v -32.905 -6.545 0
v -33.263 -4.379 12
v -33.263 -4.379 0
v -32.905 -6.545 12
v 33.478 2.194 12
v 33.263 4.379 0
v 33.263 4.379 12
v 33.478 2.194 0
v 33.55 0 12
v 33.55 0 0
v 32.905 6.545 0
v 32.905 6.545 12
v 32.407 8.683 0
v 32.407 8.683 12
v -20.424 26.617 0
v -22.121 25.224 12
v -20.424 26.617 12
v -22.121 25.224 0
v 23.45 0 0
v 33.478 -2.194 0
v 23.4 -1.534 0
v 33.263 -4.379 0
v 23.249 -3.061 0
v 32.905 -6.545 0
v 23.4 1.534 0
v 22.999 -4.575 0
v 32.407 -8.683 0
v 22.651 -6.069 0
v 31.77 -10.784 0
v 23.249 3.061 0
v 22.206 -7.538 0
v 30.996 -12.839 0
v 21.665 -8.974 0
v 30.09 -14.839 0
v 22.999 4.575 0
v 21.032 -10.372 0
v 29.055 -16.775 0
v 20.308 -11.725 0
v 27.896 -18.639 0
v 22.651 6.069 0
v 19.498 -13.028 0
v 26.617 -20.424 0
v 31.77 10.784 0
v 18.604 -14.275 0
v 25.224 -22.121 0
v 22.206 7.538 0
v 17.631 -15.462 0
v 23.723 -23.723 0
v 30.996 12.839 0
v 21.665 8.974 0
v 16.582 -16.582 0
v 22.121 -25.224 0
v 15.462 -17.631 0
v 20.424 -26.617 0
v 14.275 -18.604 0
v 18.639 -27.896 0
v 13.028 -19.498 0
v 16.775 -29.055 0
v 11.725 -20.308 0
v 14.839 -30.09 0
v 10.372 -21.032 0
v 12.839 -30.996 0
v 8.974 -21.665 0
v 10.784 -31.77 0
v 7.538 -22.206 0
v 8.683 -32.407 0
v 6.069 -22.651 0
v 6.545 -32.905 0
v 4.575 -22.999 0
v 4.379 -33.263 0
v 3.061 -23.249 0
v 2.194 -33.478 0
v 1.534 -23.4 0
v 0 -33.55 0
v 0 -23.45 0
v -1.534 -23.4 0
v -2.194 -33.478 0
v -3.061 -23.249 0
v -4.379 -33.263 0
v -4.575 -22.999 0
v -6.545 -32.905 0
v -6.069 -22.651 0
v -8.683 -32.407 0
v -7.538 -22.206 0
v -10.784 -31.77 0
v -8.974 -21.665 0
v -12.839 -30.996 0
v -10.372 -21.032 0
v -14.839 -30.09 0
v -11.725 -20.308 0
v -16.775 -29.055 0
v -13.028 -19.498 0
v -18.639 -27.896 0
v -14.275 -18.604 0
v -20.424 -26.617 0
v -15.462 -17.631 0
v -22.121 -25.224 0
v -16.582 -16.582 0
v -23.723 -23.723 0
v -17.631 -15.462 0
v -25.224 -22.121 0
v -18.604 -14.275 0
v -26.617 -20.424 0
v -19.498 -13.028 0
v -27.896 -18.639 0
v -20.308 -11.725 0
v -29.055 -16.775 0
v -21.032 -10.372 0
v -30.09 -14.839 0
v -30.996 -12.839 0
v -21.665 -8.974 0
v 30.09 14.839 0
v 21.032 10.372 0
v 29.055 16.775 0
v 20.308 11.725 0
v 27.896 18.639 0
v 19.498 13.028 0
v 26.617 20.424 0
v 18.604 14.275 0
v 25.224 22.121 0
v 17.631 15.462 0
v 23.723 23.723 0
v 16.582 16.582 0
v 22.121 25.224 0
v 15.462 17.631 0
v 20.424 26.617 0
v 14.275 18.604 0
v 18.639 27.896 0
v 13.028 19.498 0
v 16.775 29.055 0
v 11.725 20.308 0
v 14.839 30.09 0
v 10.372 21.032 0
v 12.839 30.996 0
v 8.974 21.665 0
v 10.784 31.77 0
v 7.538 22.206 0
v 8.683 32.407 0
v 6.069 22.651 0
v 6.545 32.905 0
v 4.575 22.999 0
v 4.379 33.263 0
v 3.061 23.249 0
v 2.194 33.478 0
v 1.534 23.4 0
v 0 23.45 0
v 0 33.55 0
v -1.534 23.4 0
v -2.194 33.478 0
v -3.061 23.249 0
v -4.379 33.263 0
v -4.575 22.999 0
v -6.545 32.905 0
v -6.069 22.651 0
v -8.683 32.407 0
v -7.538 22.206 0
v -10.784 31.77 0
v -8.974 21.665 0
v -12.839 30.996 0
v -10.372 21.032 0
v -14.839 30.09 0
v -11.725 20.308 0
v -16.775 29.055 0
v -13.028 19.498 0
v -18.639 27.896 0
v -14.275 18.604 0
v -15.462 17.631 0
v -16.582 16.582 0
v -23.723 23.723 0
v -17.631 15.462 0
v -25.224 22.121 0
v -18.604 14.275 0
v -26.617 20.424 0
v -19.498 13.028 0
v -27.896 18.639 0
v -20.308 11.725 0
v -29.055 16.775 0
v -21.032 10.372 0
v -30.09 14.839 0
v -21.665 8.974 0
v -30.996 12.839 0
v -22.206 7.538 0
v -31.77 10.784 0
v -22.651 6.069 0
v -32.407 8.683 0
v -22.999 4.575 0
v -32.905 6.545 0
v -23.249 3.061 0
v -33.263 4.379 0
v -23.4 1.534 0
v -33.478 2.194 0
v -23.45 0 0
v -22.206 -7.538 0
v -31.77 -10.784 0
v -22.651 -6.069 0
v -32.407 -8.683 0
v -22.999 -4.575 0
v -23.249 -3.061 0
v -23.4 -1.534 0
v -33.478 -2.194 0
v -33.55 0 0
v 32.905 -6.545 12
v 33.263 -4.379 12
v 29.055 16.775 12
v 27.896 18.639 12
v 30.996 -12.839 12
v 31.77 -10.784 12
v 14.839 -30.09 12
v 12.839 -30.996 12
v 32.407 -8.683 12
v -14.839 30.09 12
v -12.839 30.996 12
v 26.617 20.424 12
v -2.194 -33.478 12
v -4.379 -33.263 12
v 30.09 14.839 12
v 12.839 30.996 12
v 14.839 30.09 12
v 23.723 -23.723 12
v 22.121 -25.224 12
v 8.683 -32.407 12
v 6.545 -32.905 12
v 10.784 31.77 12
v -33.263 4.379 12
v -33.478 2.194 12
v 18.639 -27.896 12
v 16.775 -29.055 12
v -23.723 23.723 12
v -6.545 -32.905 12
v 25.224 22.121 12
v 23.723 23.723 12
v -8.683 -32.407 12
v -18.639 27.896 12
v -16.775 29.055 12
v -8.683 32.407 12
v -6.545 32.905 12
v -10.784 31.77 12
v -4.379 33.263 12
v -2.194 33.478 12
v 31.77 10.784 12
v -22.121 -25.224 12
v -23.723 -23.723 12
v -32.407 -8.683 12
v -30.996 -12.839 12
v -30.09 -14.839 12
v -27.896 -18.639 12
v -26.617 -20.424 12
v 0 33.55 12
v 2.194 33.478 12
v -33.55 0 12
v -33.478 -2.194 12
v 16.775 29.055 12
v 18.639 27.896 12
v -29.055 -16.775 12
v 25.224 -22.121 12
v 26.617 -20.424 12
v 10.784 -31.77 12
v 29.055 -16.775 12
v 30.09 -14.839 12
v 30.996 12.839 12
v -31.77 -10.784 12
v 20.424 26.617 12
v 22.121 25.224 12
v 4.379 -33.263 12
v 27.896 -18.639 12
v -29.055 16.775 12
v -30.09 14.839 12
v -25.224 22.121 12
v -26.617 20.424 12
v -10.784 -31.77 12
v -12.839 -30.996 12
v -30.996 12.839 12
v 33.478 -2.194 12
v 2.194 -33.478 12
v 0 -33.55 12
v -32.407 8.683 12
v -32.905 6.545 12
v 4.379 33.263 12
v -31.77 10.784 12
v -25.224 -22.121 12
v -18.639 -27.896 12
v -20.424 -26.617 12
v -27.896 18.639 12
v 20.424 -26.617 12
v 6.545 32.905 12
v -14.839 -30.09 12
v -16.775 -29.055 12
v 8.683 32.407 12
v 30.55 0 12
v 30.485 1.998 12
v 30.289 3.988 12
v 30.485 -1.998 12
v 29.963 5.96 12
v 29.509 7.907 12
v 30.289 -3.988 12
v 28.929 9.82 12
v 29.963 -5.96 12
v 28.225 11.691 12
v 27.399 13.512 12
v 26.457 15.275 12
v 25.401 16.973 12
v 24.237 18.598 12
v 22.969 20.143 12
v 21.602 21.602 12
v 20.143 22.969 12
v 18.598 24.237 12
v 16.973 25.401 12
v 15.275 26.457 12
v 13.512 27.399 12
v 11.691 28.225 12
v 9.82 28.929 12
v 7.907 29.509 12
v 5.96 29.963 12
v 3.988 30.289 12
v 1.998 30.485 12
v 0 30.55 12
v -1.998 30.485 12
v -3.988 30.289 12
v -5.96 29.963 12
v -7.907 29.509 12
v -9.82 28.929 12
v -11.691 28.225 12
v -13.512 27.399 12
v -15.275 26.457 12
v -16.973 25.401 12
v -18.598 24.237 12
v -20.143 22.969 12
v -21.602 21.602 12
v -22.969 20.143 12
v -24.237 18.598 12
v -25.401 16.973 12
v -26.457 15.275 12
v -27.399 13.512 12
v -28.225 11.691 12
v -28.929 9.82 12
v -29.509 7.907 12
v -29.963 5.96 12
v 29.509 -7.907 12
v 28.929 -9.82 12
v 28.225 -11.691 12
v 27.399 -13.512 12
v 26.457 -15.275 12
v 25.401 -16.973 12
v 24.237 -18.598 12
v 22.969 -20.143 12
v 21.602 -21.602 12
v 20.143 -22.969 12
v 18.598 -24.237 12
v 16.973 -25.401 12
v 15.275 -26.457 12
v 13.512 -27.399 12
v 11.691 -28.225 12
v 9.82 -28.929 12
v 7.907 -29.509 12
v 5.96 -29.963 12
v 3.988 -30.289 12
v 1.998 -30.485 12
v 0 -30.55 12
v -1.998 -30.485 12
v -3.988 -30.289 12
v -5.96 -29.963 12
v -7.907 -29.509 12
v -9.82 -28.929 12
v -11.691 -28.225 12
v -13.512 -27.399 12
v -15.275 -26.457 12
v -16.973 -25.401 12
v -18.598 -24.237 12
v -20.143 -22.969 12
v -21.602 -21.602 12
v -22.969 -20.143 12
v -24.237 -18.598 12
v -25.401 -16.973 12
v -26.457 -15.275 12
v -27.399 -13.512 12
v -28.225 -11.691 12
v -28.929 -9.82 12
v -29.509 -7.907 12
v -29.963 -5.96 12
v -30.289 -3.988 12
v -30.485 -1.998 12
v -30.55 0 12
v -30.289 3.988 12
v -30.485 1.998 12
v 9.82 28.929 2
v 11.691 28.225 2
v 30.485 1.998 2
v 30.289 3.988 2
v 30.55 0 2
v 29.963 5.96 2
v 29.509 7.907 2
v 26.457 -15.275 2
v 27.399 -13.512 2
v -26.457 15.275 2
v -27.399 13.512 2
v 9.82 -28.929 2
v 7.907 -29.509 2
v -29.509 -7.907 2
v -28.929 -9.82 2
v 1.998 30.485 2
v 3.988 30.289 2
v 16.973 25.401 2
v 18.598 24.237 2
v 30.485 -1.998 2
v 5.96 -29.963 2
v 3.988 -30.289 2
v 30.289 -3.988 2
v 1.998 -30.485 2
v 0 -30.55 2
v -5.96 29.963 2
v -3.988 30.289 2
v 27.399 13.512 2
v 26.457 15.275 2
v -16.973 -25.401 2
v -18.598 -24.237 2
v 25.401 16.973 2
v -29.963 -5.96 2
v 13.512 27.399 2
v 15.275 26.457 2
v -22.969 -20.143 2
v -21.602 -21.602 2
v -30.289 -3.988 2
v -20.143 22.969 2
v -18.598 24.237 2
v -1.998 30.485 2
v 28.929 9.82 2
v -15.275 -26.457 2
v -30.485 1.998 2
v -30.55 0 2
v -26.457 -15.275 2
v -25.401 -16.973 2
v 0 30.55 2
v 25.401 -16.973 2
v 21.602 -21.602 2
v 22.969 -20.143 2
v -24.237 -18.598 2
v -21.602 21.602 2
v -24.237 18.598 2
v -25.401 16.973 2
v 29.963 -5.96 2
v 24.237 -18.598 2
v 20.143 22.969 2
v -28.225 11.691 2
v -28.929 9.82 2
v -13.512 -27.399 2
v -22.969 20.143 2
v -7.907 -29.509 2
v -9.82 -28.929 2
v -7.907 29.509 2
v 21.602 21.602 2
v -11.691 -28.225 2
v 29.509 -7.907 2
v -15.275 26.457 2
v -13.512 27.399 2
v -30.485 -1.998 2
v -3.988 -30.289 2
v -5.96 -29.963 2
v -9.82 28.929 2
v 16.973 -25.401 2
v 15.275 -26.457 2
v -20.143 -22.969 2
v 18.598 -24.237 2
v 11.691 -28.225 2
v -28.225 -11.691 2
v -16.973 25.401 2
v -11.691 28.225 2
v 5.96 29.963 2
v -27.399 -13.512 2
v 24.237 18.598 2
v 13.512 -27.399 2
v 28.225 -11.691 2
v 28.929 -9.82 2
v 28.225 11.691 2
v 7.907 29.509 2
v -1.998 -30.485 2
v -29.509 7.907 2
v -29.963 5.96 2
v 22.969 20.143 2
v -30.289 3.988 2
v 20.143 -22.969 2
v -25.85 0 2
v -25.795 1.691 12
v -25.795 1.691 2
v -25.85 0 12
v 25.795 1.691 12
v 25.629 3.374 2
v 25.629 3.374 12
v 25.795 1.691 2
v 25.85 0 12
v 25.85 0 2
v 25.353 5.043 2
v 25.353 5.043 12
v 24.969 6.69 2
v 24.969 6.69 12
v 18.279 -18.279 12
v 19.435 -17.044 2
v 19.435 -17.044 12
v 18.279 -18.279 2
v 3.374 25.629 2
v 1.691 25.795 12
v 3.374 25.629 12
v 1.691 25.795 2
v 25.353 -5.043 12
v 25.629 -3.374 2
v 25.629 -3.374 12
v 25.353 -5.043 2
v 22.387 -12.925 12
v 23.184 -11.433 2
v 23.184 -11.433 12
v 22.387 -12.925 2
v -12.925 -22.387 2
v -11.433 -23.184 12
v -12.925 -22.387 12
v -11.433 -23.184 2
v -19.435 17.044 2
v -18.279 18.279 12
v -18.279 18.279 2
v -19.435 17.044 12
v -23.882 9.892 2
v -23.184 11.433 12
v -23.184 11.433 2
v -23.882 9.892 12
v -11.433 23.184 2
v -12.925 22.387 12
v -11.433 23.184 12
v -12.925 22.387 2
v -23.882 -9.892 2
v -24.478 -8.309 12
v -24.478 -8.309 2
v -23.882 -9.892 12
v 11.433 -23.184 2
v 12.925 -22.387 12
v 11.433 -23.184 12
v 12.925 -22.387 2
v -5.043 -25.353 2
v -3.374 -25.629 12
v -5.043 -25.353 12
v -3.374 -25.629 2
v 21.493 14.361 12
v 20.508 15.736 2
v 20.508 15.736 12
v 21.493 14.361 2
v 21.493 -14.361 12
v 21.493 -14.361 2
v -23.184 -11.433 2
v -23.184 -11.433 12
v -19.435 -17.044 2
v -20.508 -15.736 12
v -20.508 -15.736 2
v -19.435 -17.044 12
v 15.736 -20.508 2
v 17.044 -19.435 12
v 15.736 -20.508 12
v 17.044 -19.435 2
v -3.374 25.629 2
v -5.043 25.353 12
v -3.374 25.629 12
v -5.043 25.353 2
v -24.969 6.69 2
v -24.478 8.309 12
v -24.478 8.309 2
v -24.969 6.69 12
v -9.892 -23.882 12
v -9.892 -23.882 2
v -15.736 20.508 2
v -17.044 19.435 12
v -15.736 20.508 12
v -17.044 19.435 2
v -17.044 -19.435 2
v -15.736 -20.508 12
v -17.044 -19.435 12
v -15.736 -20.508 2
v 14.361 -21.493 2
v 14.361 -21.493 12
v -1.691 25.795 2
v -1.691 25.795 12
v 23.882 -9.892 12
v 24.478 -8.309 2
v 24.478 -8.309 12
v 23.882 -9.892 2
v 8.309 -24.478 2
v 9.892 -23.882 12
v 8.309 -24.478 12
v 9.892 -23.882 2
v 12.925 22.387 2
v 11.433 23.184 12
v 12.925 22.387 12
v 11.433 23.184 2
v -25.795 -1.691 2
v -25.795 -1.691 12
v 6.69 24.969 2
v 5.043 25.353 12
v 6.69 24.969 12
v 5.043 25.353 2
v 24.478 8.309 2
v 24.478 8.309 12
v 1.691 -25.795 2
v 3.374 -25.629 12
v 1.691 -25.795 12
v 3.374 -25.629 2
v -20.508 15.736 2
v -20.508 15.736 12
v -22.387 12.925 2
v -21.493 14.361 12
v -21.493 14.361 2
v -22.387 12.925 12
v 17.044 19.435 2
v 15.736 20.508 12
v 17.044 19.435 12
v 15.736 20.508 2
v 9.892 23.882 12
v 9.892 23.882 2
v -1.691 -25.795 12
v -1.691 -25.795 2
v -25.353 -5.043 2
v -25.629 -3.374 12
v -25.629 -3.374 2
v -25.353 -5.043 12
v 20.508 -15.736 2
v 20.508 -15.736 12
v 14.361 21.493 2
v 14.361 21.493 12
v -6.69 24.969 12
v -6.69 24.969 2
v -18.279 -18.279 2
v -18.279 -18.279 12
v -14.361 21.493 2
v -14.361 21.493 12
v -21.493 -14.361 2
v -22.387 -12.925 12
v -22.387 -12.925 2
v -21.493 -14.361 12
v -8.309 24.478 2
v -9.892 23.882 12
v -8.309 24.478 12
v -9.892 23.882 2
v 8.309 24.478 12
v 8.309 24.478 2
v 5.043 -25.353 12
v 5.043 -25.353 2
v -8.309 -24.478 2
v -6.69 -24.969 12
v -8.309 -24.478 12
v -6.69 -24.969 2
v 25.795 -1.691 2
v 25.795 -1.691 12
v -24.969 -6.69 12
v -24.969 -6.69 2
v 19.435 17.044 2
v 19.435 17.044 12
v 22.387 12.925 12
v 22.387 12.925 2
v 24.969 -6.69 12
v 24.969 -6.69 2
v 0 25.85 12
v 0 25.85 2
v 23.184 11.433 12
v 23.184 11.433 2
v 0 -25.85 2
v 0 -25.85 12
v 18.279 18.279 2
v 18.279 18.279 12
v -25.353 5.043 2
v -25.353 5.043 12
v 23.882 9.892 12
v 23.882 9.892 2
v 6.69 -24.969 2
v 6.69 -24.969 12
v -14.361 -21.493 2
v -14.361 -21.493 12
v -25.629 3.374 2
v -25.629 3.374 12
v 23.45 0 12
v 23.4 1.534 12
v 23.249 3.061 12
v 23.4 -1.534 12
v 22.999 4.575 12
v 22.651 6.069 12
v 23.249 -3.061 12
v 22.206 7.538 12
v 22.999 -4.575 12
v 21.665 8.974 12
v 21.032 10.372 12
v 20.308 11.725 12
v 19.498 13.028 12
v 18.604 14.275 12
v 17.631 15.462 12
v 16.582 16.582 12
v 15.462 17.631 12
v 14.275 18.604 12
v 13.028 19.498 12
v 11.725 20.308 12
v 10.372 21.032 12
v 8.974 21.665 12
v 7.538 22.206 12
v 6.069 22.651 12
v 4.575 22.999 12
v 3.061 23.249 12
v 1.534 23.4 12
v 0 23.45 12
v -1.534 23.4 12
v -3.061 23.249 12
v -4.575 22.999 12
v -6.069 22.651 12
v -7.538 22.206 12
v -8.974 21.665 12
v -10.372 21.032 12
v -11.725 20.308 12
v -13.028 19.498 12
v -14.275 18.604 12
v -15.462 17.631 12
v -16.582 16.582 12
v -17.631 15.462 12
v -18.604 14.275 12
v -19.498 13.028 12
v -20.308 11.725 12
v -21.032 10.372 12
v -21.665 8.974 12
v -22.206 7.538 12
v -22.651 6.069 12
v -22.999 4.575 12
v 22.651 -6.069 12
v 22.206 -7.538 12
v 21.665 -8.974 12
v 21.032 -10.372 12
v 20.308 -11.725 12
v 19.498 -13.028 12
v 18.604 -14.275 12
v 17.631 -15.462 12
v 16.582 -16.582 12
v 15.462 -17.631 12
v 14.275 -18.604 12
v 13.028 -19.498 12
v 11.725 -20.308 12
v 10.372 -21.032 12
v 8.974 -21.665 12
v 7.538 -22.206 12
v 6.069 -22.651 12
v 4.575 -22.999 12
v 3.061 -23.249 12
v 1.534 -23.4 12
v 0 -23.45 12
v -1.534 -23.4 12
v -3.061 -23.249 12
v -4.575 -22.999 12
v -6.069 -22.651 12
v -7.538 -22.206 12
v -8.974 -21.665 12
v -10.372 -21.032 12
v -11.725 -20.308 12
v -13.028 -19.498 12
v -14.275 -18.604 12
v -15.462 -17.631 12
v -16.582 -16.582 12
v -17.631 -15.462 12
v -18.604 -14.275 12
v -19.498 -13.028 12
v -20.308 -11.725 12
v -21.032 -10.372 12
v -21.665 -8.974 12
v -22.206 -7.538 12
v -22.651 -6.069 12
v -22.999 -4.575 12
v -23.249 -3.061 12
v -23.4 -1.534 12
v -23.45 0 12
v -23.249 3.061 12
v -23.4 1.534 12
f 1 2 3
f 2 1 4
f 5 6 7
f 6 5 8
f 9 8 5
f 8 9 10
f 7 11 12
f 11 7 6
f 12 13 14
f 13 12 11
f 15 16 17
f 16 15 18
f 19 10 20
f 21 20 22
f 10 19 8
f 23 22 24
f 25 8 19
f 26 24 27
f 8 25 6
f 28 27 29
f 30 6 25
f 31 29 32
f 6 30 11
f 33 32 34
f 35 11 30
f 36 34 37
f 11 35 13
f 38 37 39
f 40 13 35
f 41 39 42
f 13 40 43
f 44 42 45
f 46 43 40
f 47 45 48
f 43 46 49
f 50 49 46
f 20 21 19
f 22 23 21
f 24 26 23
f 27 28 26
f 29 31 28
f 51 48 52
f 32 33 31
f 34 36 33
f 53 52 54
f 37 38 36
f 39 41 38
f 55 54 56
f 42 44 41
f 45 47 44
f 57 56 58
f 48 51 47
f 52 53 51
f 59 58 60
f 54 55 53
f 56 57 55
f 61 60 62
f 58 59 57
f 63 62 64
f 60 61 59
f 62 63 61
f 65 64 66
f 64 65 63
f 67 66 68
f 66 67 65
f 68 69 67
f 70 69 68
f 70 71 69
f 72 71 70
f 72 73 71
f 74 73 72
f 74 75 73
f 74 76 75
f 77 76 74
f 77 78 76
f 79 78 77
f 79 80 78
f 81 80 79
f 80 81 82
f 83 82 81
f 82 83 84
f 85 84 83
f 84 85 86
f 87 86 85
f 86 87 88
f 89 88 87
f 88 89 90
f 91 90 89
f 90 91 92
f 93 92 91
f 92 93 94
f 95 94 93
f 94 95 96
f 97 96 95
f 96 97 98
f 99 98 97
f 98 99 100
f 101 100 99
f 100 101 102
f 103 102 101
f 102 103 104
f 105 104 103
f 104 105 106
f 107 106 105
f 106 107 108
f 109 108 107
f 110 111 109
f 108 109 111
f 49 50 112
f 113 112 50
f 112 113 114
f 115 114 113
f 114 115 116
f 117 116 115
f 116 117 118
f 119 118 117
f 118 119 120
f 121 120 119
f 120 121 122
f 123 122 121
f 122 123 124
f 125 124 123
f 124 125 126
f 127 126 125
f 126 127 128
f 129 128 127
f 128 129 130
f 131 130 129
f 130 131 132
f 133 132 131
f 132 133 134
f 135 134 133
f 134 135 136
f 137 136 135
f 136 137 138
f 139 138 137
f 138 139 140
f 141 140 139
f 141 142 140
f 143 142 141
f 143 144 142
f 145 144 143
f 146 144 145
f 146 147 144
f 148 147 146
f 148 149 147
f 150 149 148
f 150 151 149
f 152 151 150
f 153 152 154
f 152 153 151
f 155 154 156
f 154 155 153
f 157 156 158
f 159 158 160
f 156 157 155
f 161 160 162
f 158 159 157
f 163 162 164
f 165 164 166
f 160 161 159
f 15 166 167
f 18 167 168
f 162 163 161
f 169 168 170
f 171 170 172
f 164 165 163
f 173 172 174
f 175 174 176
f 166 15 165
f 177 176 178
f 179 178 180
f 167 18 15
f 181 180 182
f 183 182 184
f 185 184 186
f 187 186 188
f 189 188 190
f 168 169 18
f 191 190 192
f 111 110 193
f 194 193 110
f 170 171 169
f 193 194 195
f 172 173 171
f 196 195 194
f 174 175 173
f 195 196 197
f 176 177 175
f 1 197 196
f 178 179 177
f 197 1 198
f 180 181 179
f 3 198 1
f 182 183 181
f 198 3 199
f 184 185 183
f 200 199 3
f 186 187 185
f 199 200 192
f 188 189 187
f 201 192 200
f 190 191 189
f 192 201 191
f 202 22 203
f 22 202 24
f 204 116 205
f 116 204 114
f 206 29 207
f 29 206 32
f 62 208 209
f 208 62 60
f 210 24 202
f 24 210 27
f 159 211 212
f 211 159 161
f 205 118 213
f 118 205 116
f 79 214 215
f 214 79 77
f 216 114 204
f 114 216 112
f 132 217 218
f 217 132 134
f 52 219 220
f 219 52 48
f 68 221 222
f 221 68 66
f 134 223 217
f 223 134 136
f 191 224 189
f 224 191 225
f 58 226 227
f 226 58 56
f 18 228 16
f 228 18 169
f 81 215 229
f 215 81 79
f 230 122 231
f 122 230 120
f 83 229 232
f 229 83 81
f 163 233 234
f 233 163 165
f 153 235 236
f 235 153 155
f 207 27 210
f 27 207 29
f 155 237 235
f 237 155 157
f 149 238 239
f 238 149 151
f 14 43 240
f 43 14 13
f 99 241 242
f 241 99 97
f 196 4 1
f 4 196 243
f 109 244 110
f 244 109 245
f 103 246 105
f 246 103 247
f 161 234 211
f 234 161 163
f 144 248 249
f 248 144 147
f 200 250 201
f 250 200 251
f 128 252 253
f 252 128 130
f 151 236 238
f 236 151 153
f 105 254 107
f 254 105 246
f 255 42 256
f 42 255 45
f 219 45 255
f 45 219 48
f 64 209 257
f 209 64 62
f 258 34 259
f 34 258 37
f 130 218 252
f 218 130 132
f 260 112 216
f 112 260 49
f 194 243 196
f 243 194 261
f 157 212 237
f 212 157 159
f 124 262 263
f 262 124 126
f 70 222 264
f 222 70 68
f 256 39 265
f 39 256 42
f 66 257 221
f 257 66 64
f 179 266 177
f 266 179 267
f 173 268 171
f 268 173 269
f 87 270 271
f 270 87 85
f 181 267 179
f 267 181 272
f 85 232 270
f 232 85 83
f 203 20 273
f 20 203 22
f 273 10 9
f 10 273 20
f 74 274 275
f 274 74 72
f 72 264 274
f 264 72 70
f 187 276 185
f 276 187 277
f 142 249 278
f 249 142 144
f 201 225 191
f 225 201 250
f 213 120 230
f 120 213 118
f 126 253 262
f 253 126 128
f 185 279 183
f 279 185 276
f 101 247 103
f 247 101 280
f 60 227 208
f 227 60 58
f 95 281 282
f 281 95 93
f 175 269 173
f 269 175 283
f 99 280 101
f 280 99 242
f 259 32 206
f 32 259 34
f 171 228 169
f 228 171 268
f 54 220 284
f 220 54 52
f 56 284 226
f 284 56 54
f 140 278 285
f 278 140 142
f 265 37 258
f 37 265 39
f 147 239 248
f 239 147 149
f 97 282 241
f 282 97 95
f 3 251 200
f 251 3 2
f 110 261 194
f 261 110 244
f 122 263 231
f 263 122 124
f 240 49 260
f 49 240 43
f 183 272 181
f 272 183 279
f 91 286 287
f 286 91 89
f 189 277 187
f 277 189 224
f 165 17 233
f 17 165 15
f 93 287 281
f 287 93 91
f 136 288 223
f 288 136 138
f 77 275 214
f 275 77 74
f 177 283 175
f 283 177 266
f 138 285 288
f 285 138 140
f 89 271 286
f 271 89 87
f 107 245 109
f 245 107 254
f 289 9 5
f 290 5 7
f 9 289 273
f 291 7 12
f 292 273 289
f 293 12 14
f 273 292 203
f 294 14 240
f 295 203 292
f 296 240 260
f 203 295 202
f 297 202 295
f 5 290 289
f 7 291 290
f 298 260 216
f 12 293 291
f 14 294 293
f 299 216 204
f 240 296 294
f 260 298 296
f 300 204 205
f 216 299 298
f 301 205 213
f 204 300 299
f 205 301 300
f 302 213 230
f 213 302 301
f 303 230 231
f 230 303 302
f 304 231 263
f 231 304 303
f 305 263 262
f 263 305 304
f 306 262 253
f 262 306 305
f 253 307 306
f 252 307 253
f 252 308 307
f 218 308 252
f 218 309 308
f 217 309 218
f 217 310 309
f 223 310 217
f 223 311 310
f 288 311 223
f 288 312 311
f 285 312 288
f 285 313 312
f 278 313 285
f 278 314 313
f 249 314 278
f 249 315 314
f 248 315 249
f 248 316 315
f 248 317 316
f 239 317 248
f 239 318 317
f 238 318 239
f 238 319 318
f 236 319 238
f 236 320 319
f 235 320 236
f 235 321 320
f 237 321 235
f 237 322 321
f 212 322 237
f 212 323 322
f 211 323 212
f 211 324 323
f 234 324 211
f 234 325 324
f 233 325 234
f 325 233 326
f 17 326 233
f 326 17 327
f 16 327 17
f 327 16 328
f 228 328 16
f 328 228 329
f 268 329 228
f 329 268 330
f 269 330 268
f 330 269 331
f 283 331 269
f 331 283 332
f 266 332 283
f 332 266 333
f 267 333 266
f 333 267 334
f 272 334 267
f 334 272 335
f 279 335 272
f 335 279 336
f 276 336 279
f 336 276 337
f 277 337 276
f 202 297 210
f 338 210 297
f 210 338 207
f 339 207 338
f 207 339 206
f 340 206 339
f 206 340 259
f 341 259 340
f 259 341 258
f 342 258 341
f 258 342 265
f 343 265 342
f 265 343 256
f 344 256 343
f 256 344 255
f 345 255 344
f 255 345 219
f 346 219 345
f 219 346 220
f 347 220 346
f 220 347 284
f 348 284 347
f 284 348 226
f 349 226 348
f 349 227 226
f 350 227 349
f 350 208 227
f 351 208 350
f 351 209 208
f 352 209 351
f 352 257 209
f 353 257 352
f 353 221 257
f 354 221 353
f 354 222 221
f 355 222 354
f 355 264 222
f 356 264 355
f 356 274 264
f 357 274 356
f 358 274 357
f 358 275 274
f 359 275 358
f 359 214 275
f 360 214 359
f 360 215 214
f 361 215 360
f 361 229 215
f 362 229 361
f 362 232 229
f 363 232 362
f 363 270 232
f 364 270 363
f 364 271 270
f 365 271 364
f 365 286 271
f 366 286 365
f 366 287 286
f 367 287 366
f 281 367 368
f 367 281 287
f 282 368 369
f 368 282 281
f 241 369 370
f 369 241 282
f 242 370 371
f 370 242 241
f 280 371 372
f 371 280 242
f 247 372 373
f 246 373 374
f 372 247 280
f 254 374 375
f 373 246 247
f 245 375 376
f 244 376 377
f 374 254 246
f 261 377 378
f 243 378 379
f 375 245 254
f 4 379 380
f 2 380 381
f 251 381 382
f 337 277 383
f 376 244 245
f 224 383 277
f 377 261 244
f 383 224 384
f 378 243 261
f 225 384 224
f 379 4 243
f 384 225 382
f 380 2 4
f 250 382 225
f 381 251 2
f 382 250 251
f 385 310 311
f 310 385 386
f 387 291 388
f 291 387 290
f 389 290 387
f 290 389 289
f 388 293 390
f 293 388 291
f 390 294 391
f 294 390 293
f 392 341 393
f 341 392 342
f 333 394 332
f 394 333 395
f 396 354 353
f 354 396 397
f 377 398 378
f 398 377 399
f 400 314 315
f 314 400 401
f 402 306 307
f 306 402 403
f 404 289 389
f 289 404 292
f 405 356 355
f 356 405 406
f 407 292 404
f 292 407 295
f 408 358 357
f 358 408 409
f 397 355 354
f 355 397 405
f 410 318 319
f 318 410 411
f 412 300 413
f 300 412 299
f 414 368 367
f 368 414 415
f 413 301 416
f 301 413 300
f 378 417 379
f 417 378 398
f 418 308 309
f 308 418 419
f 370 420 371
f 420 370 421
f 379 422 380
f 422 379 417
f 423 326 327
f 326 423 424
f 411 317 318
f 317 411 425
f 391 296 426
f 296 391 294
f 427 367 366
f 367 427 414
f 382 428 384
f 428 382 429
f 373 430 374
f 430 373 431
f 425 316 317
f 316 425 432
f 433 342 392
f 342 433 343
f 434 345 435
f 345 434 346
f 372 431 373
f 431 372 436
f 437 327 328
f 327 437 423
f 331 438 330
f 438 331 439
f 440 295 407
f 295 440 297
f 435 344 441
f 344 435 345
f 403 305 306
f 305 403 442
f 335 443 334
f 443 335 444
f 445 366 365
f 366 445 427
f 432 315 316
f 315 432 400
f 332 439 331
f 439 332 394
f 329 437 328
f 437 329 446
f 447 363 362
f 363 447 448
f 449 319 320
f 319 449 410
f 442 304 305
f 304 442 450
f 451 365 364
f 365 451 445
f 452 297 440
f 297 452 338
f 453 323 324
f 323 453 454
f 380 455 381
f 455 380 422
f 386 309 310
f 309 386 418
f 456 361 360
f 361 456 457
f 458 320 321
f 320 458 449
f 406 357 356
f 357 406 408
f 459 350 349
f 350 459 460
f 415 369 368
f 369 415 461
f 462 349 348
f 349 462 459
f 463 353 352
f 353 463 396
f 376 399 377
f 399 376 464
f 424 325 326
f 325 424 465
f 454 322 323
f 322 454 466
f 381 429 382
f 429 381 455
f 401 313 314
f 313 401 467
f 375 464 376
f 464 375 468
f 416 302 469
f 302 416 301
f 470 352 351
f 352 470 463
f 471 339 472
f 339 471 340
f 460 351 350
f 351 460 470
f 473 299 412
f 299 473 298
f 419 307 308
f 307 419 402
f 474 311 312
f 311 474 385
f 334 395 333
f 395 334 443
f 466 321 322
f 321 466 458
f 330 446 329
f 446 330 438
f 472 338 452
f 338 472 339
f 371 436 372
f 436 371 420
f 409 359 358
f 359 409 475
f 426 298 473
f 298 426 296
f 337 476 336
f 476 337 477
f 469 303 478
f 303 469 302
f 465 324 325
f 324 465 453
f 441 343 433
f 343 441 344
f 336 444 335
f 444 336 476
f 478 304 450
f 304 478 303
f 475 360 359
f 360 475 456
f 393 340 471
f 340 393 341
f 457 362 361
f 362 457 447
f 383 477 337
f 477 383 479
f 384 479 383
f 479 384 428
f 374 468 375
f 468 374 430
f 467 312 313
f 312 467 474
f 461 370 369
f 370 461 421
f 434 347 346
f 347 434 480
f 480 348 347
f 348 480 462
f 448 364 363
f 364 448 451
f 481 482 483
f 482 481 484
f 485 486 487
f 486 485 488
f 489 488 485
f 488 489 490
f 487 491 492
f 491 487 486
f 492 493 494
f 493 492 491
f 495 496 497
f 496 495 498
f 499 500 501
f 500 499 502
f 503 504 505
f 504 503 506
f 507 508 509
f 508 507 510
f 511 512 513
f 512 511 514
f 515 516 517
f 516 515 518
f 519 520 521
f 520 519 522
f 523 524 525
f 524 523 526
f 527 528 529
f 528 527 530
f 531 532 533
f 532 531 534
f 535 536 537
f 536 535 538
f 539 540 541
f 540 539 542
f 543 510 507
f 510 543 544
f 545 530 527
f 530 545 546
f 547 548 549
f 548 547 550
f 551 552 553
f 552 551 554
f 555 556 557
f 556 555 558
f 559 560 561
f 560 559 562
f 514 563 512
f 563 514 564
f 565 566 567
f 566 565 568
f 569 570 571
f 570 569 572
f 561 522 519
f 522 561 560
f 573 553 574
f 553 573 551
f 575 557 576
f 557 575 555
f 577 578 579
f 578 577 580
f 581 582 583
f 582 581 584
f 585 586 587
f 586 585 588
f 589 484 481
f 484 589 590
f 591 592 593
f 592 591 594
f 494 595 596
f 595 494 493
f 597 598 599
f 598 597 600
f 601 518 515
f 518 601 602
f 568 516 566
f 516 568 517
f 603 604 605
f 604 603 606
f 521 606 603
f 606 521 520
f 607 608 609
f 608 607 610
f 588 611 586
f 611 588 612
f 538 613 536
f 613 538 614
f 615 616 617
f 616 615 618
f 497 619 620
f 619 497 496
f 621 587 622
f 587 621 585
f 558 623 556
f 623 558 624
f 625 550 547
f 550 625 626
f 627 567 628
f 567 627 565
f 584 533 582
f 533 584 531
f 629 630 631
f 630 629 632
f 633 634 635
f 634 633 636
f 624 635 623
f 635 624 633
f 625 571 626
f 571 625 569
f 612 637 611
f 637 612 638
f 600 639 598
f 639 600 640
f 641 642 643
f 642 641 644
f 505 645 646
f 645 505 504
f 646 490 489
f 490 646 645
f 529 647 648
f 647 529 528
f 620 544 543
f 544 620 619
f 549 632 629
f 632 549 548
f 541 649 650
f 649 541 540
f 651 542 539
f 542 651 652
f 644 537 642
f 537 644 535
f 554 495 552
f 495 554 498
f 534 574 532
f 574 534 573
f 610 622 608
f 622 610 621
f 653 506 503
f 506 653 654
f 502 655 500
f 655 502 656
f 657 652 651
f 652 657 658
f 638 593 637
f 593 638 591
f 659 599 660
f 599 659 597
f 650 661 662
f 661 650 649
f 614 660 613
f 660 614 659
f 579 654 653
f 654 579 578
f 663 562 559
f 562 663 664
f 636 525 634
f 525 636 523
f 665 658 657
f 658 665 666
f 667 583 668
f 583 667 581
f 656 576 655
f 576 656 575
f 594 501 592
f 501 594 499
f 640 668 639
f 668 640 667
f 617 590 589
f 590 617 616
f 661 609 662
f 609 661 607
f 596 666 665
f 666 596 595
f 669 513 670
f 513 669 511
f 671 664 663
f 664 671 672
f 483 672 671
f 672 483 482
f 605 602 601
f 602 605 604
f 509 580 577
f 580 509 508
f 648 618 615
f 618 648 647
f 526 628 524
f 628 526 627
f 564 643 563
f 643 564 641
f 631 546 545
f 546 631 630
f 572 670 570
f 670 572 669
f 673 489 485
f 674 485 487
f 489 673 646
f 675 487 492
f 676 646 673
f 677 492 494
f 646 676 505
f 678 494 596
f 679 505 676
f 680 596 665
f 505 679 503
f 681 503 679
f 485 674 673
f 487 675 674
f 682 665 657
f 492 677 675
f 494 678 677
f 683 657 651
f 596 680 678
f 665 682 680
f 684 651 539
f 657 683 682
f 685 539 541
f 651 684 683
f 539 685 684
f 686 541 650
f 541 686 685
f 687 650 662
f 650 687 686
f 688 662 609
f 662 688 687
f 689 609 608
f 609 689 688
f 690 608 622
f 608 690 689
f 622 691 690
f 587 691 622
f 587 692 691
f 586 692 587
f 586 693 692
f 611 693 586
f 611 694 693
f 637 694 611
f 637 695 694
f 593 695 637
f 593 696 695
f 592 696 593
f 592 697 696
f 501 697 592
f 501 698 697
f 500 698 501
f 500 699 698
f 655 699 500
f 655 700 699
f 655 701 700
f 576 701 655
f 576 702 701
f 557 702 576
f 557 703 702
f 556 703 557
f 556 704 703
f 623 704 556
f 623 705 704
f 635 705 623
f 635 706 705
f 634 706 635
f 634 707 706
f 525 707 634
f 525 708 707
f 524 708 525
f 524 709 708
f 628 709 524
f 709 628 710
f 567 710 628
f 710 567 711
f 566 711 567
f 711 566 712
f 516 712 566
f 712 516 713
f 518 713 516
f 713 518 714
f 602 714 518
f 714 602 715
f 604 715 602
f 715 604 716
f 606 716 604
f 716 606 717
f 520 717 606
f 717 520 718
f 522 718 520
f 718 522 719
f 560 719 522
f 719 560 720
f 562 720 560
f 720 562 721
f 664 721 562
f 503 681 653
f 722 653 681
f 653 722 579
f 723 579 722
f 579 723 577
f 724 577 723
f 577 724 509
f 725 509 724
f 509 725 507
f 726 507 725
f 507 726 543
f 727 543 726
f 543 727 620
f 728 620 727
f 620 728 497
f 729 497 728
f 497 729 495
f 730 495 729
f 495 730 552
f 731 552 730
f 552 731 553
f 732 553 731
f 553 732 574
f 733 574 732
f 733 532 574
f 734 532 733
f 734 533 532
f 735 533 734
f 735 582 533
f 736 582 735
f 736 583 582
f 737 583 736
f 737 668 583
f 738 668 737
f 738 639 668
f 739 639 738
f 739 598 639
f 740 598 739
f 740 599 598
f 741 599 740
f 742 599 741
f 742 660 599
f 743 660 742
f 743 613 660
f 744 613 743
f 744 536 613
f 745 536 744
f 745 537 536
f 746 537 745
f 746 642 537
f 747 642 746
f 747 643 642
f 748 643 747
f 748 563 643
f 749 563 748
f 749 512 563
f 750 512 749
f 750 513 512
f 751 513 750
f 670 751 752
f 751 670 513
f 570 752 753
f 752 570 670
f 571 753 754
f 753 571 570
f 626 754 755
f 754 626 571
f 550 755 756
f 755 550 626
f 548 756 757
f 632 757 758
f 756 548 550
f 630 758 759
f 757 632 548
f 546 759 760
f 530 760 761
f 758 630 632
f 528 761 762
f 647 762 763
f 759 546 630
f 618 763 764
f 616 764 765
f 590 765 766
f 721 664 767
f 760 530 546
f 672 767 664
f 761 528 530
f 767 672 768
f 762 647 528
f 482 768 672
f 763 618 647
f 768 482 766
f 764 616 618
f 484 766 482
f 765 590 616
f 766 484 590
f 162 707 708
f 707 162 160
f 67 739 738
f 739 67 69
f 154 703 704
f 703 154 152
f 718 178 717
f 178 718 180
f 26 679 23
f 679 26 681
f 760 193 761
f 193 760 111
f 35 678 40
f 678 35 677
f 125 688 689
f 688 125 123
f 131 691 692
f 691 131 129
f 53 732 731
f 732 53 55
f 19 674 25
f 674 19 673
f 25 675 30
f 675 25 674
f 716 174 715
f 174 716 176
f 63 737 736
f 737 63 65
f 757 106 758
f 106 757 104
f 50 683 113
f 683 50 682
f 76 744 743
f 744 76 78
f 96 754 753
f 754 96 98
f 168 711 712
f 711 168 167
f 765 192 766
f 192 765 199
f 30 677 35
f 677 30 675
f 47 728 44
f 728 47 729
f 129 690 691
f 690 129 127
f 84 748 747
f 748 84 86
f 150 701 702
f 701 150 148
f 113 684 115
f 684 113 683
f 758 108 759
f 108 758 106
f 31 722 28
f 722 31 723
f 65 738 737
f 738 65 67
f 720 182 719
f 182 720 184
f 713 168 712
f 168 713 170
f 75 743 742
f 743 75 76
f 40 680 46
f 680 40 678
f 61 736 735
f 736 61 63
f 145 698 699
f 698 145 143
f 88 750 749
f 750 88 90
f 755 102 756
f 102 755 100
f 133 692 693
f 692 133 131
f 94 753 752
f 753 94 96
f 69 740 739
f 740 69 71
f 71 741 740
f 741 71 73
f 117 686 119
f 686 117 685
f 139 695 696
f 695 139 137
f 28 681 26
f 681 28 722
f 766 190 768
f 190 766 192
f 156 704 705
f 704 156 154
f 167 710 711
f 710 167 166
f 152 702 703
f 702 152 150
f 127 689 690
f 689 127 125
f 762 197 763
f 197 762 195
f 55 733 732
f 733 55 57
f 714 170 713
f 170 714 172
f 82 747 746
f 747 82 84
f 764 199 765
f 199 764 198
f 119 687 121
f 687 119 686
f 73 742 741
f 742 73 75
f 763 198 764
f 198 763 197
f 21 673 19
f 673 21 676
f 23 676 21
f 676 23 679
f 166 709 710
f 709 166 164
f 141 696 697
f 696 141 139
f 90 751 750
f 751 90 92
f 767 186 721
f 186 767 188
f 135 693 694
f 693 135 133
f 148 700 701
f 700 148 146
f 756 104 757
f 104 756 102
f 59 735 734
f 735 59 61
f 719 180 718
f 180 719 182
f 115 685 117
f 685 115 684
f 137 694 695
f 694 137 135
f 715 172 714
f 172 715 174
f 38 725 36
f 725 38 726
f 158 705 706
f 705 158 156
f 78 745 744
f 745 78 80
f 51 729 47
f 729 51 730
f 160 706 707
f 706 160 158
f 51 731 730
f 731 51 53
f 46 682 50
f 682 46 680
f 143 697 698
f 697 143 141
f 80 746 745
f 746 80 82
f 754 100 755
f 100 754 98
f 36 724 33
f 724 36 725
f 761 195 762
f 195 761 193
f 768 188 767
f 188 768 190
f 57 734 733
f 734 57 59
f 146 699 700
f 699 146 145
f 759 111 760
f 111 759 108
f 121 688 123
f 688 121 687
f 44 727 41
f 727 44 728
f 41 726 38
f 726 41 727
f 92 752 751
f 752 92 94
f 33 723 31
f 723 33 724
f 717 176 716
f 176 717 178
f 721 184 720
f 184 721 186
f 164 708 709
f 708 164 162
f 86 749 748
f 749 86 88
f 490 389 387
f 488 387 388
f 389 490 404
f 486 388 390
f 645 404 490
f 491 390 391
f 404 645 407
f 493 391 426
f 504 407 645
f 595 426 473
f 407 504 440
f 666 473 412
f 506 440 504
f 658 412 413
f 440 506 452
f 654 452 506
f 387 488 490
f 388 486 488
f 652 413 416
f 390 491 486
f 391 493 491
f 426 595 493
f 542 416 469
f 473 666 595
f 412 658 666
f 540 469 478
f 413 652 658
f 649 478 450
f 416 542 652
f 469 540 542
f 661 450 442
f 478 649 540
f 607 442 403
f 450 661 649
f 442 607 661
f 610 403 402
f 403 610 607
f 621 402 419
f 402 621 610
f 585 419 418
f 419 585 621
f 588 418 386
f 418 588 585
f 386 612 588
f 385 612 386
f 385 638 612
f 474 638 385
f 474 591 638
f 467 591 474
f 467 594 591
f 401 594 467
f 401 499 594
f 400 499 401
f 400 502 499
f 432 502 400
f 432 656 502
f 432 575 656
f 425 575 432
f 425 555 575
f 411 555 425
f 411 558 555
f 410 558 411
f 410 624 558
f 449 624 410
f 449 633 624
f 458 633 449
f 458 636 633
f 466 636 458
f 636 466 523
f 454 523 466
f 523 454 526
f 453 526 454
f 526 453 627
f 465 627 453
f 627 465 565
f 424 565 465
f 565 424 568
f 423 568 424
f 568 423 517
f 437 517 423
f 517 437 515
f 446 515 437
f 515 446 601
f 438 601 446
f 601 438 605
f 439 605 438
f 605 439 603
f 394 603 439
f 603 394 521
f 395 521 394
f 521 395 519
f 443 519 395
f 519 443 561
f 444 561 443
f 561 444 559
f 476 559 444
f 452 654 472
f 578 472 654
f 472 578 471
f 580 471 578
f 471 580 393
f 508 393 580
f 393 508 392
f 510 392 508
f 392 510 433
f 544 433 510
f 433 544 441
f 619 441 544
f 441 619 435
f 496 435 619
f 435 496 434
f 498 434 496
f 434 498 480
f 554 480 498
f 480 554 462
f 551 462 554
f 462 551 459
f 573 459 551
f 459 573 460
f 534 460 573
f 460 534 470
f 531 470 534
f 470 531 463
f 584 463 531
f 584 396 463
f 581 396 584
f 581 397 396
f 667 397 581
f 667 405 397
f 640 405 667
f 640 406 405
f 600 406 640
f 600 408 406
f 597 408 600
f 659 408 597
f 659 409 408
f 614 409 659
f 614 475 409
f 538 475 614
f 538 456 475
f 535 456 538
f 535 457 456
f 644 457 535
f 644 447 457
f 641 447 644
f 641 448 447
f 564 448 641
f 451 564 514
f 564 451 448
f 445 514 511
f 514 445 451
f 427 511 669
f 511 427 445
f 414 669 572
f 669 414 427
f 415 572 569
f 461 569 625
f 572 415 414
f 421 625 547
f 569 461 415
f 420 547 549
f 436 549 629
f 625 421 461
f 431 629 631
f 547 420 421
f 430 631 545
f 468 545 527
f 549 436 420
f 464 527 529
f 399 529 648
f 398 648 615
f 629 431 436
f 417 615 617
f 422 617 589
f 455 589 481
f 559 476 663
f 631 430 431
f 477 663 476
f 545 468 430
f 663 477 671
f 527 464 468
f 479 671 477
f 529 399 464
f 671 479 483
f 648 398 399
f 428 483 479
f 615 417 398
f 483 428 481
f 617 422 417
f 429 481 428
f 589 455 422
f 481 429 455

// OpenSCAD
// Tapa de eco — piezas imprimibles, v0.2
// OpenSCAD 2021.01 o mas nuevo. Elegir PART, renderizar (F6), exportar STL.
// Unidades: mm. Por defecto: casing PVC 2" Sch 40 y parlante de 36 mm.
//
// v0.2: el mic A se corre a mic_r = 26.5 mm para no pisar el marco del
// parlante; un canal de 1 mm une el puerto con su agujero de sonido.

PART = "fit_ring"; // [fit_ring, sleeve, box, lid, gasket_lid, gasket_flange, pod, pod_cap, all]

/* [Casing] */
casing_od = 60.3;   // 2" Sch 40. 4" Sch 40: 114.3
casing_id = 52.5;   // 2" Sch 40. 4" Sch 40: 102.3
fit       = 0.4;    // holgura radial de cada ajuste; afinar con fit_ring

/* [Parlante] */
spk_d     = 36.6;   // diametro del marco + 0.6
spk_rim   = 2.6;    // espesor del borde del marco = profundidad del asiento
spk_open  = 31;     // abertura bajo el cono

/* [Manga] */
flange    = 84;     // lado de la brida cuadrada
flange_t  = 6;
skirt_h   = 40;
skirt_w   = 3;
spigot_h  = 12;
spigot_w  = 2.4;
port_d    = 2.0;    // puerto acustico del mic A
port_r    = 20.9;   // distancia del puerto al centro
mic_r     = 26.5;   // centro de la placa del mic A
mic_pcb_d = 14.6;   // placa redonda INMP441; medir la tuya
groove_t  = 1.0;    // profundidad del canal puerto -> mic
cable_d   = 4.6;    // paso del cable colgante
cable_r   = 20.9;   // lado opuesto al puerto
bolt_off  = 34;     // cuadrado de pernos brida-caja, mitad del paso
bolt_d    = 3.4;    // paso M3
insert_d  = 4.0;    // agujero para inserto M3 termofijo; revisar los tuyos

/* [Caja] */
box_in     = [190, 90, 50];
box_w      = 2.4;
floor_t    = 3;
corner_r   = 6;
lid_t      = 3;
vent_d     = 12.3;  // venteo M12
floor_open = 72;    // abertura sobre la brida: parlante, mic A, cable
batt_x     = 66;    // centro del bolsillo de la LiPo
carrier_x  = -65;   // centro de la placa portadora

/* [Capsula] */
pod_od    = 20;
pod_len   = 34;
lead_d    = 4.6;

$fn = 96;
e = 0.01;
bore_r = casing_id/2 - fit - spigot_w;

assert(port_r - port_d/2 > spk_d/2, "el puerto del mic A corta el asiento del parlante");
assert(port_r + port_d/2 < bore_r, "el puerto del mic A cae fuera del spigot");
assert(mic_r - mic_pcb_d/2 > spk_d/2, "la placa del mic A pisa el marco del parlante");
assert(mic_r + mic_pcb_d/2 < floor_open/2, "la placa del mic A queda bajo el piso de la caja");
assert(cable_r - cable_d/2 > spk_d/2 && cable_r + cable_d/2 < bore_r,
       "el agujero del cable no cabe junto al parlante");

module rrect(size, r, h) {
  linear_extrude(h) offset(r = r) offset(delta = -r) square(size, center = true);
}

module tube(ro, ri, h) {
  difference() {
    cylinder(r = ro, h = h);
    translate([0, 0, -e]) cylinder(r = ri, h = h + 2*e);
  }
}

// Rebanada de 12 mm de la manga: probar el ajuste antes de imprimir la pieza real
module fit_ring() {
  difference() {
    union() {
      cylinder(r = casing_od/2 + fit + skirt_w, h = 2);
      tube(casing_od/2 + fit + skirt_w, casing_od/2 + fit, 12);
      tube(casing_id/2 - fit, bore_r, 12);
    }
    translate([0, 0, -e]) cylinder(r = bore_r, h = 3);
  }
}

// Se imprime con la brida abajo: z = 0 es la cara que toca la caja.
module sleeve() {
  difference() {
    union() {
      rrect([flange, flange], 6, flange_t);
      translate([0, 0, flange_t - e]) tube(casing_od/2 + fit + skirt_w, casing_od/2 + fit, skirt_h);
      translate([0, 0, flange_t - e]) tube(casing_id/2 - fit, bore_r, spigot_h);
      for (a = [0, 120, 240]) rotate(a)                  // resaltes de los tornillos mariposa
        translate([casing_od/2 + fit + skirt_w - 1, 0, flange_t + skirt_h - 12])
          rotate([0, 90, 0]) cylinder(d = 9, h = 5);
    }
    translate([0, 0, -e]) cylinder(d = spk_d, h = spk_rim + e);          // asiento del parlante
    translate([0, 0, -e]) cylinder(d = spk_open, h = flange_t + 2*e);    // abertura bajo el cono
    translate([port_r, 0, -e]) cylinder(d = port_d, h = flange_t + 2*e); // puerto del mic A
    translate([port_r, -port_d/2, -e])                                     // canal puerto -> mic A
      cube([mic_r - port_r, port_d, groove_t + e]);
    translate([-cable_r, 0, -e]) cylinder(d = cable_d, h = flange_t + 2*e);
    for (x = [-1, 1], y = [-1, 1])
      translate([x*bolt_off, y*bolt_off, -e]) cylinder(d = bolt_d, h = flange_t + 2*e);
    for (a = [0, 120, 240]) rotate(a)                    // insertos de los tornillos mariposa
      translate([casing_od/2 + fit - 1, 0, flange_t + skirt_h - 12])
        rotate([0, 90, 0]) cylinder(d = insert_d, h = skirt_w + 7);
  }
}

module box() {
  o = [box_in[0] + 2*box_w, box_in[1] + 2*box_w];
  lb = [box_in[0]/2 - 4, box_in[1]/2 - 4];
  difference() {
    union() {
      difference() {
        rrect(o, corner_r, floor_t + box_in[2]);
        translate([0, 0, floor_t]) rrect(box_in, corner_r - box_w, box_in[2] + e);
      }
      for (x = [-1, 1], y = [-1, 1]) {
        translate([x*lb[0], y*lb[1], 0]) cylinder(d = 8, h = floor_t + box_in[2]);    // tornillos de la tapa
        translate([x*bolt_off, y*bolt_off, 0]) cylinder(d = 8, h = floor_t + 5);     // tornillos de la brida
        translate([carrier_x + x*25, y*20, 0]) cylinder(d = 7, h = floor_t + 6);     // placa portadora
      }
      translate([batt_x, 0, floor_t - e]) difference() {                              // bolsillo de la LiPo
        rrect([56, 40], 2, 10);
        translate([0, 0, -e]) rrect([52, 36], 1, 10 + 2*e);
      }
    }
    translate([0, 0, -e]) cylinder(d = floor_open, h = floor_t + 2*e);
    for (x = [-1, 1], y = [-1, 1]) {
      translate([x*lb[0], y*lb[1], floor_t + box_in[2] - 6]) cylinder(d = insert_d, h = 6 + e);
      translate([x*bolt_off, y*bolt_off, -e]) cylinder(d = insert_d, h = floor_t + 5 + 2*e);
      translate([carrier_x + x*25, y*20, floor_t]) cylinder(d = insert_d, h = 6 + e);
    }
  }
}

// Se imprime con la cara exterior abajo; el labio calza dentro de la caja.
module lid() {
  o = [box_in[0] + 2*box_w, box_in[1] + 2*box_w];
  lb = [box_in[0]/2 - 4, box_in[1]/2 - 4];
  difference() {
    union() {
      rrect(o, corner_r, lid_t);
      translate([0, 0, lid_t - e]) difference() {
        rrect([box_in[0] - 0.6, box_in[1] - 0.6], corner_r - box_w, 3);
        translate([0, 0, -e]) rrect([box_in[0] - 4.6, box_in[1] - 4.6], corner_r - box_w - 1.5, 3 + 2*e);
      }
    }
    for (x = [-1, 1], y = [-1, 1]) {
      translate([x*lb[0], y*lb[1], -e]) cylinder(d = bolt_d, h = lid_t + 2*e);
      translate([x*lb[0], y*lb[1], lid_t]) cylinder(d = 9.5, h = 3 + e);   // el labio libra los resaltes
    }
    translate([-box_in[0]/4, 0, -e]) cylinder(d = vent_d, h = lid_t + 2*e);
  }
}

module gasket_lid() {
  o = [box_in[0] + 2*box_w, box_in[1] + 2*box_w];
  difference() {
    rrect(o, corner_r, 1.2);
    translate([0, 0, -e]) rrect([box_in[0] - 0.2, box_in[1] - 0.2], corner_r - box_w, 1.2 + 2*e);
  }
}

module gasket_flange() {
  difference() {
    rrect([flange, flange], 6, 1.2);
    translate([0, 0, -e]) cylinder(d = floor_open, h = 1.2 + 2*e);
    for (x = [-1, 1], y = [-1, 1])
      translate([x*bolt_off, y*bolt_off, -e]) cylinder(d = bolt_d, h = 1.2 + 2*e);
  }
}

// Se imprime con el puerto abajo. El agujero de sonido de la placa mira al puerto de 2 mm.
module pod() {
  difference() {
    cylinder(d = pod_od, h = pod_len);
    translate([0, 0, 2]) cylinder(d = mic_pcb_d + 0.4, h = pod_len);
    translate([0, 0, -e]) cylinder(d = 2, h = 2 + 2*e);
  }
}

module pod_cap() {
  difference() {
    union() {
      cylinder(d = pod_od, h = 3);
      translate([0, 0, 3 - e]) cylinder(d = mic_pcb_d + 0.2, h = 4);
    }
    translate([0, 0, -e]) cylinder(d = lead_d, h = 10);
  }
}

if (PART == "fit_ring") fit_ring();
else if (PART == "sleeve") sleeve();
else if (PART == "box") box();
else if (PART == "lid") lid();
else if (PART == "gasket_lid") gasket_lid();
else if (PART == "gasket_flange") gasket_flange();
else if (PART == "pod") pod();
else if (PART == "pod_cap") pod_cap();
else if (PART == "all") {
  sleeve();
  translate([0, 120, 0]) box();
  translate([0, 230, 0]) lid();
  translate([-100, 0, 0]) fit_ring();
  translate([90, 0, 0]) pod();
  translate([120, 0, 0]) pod_cap();
}
